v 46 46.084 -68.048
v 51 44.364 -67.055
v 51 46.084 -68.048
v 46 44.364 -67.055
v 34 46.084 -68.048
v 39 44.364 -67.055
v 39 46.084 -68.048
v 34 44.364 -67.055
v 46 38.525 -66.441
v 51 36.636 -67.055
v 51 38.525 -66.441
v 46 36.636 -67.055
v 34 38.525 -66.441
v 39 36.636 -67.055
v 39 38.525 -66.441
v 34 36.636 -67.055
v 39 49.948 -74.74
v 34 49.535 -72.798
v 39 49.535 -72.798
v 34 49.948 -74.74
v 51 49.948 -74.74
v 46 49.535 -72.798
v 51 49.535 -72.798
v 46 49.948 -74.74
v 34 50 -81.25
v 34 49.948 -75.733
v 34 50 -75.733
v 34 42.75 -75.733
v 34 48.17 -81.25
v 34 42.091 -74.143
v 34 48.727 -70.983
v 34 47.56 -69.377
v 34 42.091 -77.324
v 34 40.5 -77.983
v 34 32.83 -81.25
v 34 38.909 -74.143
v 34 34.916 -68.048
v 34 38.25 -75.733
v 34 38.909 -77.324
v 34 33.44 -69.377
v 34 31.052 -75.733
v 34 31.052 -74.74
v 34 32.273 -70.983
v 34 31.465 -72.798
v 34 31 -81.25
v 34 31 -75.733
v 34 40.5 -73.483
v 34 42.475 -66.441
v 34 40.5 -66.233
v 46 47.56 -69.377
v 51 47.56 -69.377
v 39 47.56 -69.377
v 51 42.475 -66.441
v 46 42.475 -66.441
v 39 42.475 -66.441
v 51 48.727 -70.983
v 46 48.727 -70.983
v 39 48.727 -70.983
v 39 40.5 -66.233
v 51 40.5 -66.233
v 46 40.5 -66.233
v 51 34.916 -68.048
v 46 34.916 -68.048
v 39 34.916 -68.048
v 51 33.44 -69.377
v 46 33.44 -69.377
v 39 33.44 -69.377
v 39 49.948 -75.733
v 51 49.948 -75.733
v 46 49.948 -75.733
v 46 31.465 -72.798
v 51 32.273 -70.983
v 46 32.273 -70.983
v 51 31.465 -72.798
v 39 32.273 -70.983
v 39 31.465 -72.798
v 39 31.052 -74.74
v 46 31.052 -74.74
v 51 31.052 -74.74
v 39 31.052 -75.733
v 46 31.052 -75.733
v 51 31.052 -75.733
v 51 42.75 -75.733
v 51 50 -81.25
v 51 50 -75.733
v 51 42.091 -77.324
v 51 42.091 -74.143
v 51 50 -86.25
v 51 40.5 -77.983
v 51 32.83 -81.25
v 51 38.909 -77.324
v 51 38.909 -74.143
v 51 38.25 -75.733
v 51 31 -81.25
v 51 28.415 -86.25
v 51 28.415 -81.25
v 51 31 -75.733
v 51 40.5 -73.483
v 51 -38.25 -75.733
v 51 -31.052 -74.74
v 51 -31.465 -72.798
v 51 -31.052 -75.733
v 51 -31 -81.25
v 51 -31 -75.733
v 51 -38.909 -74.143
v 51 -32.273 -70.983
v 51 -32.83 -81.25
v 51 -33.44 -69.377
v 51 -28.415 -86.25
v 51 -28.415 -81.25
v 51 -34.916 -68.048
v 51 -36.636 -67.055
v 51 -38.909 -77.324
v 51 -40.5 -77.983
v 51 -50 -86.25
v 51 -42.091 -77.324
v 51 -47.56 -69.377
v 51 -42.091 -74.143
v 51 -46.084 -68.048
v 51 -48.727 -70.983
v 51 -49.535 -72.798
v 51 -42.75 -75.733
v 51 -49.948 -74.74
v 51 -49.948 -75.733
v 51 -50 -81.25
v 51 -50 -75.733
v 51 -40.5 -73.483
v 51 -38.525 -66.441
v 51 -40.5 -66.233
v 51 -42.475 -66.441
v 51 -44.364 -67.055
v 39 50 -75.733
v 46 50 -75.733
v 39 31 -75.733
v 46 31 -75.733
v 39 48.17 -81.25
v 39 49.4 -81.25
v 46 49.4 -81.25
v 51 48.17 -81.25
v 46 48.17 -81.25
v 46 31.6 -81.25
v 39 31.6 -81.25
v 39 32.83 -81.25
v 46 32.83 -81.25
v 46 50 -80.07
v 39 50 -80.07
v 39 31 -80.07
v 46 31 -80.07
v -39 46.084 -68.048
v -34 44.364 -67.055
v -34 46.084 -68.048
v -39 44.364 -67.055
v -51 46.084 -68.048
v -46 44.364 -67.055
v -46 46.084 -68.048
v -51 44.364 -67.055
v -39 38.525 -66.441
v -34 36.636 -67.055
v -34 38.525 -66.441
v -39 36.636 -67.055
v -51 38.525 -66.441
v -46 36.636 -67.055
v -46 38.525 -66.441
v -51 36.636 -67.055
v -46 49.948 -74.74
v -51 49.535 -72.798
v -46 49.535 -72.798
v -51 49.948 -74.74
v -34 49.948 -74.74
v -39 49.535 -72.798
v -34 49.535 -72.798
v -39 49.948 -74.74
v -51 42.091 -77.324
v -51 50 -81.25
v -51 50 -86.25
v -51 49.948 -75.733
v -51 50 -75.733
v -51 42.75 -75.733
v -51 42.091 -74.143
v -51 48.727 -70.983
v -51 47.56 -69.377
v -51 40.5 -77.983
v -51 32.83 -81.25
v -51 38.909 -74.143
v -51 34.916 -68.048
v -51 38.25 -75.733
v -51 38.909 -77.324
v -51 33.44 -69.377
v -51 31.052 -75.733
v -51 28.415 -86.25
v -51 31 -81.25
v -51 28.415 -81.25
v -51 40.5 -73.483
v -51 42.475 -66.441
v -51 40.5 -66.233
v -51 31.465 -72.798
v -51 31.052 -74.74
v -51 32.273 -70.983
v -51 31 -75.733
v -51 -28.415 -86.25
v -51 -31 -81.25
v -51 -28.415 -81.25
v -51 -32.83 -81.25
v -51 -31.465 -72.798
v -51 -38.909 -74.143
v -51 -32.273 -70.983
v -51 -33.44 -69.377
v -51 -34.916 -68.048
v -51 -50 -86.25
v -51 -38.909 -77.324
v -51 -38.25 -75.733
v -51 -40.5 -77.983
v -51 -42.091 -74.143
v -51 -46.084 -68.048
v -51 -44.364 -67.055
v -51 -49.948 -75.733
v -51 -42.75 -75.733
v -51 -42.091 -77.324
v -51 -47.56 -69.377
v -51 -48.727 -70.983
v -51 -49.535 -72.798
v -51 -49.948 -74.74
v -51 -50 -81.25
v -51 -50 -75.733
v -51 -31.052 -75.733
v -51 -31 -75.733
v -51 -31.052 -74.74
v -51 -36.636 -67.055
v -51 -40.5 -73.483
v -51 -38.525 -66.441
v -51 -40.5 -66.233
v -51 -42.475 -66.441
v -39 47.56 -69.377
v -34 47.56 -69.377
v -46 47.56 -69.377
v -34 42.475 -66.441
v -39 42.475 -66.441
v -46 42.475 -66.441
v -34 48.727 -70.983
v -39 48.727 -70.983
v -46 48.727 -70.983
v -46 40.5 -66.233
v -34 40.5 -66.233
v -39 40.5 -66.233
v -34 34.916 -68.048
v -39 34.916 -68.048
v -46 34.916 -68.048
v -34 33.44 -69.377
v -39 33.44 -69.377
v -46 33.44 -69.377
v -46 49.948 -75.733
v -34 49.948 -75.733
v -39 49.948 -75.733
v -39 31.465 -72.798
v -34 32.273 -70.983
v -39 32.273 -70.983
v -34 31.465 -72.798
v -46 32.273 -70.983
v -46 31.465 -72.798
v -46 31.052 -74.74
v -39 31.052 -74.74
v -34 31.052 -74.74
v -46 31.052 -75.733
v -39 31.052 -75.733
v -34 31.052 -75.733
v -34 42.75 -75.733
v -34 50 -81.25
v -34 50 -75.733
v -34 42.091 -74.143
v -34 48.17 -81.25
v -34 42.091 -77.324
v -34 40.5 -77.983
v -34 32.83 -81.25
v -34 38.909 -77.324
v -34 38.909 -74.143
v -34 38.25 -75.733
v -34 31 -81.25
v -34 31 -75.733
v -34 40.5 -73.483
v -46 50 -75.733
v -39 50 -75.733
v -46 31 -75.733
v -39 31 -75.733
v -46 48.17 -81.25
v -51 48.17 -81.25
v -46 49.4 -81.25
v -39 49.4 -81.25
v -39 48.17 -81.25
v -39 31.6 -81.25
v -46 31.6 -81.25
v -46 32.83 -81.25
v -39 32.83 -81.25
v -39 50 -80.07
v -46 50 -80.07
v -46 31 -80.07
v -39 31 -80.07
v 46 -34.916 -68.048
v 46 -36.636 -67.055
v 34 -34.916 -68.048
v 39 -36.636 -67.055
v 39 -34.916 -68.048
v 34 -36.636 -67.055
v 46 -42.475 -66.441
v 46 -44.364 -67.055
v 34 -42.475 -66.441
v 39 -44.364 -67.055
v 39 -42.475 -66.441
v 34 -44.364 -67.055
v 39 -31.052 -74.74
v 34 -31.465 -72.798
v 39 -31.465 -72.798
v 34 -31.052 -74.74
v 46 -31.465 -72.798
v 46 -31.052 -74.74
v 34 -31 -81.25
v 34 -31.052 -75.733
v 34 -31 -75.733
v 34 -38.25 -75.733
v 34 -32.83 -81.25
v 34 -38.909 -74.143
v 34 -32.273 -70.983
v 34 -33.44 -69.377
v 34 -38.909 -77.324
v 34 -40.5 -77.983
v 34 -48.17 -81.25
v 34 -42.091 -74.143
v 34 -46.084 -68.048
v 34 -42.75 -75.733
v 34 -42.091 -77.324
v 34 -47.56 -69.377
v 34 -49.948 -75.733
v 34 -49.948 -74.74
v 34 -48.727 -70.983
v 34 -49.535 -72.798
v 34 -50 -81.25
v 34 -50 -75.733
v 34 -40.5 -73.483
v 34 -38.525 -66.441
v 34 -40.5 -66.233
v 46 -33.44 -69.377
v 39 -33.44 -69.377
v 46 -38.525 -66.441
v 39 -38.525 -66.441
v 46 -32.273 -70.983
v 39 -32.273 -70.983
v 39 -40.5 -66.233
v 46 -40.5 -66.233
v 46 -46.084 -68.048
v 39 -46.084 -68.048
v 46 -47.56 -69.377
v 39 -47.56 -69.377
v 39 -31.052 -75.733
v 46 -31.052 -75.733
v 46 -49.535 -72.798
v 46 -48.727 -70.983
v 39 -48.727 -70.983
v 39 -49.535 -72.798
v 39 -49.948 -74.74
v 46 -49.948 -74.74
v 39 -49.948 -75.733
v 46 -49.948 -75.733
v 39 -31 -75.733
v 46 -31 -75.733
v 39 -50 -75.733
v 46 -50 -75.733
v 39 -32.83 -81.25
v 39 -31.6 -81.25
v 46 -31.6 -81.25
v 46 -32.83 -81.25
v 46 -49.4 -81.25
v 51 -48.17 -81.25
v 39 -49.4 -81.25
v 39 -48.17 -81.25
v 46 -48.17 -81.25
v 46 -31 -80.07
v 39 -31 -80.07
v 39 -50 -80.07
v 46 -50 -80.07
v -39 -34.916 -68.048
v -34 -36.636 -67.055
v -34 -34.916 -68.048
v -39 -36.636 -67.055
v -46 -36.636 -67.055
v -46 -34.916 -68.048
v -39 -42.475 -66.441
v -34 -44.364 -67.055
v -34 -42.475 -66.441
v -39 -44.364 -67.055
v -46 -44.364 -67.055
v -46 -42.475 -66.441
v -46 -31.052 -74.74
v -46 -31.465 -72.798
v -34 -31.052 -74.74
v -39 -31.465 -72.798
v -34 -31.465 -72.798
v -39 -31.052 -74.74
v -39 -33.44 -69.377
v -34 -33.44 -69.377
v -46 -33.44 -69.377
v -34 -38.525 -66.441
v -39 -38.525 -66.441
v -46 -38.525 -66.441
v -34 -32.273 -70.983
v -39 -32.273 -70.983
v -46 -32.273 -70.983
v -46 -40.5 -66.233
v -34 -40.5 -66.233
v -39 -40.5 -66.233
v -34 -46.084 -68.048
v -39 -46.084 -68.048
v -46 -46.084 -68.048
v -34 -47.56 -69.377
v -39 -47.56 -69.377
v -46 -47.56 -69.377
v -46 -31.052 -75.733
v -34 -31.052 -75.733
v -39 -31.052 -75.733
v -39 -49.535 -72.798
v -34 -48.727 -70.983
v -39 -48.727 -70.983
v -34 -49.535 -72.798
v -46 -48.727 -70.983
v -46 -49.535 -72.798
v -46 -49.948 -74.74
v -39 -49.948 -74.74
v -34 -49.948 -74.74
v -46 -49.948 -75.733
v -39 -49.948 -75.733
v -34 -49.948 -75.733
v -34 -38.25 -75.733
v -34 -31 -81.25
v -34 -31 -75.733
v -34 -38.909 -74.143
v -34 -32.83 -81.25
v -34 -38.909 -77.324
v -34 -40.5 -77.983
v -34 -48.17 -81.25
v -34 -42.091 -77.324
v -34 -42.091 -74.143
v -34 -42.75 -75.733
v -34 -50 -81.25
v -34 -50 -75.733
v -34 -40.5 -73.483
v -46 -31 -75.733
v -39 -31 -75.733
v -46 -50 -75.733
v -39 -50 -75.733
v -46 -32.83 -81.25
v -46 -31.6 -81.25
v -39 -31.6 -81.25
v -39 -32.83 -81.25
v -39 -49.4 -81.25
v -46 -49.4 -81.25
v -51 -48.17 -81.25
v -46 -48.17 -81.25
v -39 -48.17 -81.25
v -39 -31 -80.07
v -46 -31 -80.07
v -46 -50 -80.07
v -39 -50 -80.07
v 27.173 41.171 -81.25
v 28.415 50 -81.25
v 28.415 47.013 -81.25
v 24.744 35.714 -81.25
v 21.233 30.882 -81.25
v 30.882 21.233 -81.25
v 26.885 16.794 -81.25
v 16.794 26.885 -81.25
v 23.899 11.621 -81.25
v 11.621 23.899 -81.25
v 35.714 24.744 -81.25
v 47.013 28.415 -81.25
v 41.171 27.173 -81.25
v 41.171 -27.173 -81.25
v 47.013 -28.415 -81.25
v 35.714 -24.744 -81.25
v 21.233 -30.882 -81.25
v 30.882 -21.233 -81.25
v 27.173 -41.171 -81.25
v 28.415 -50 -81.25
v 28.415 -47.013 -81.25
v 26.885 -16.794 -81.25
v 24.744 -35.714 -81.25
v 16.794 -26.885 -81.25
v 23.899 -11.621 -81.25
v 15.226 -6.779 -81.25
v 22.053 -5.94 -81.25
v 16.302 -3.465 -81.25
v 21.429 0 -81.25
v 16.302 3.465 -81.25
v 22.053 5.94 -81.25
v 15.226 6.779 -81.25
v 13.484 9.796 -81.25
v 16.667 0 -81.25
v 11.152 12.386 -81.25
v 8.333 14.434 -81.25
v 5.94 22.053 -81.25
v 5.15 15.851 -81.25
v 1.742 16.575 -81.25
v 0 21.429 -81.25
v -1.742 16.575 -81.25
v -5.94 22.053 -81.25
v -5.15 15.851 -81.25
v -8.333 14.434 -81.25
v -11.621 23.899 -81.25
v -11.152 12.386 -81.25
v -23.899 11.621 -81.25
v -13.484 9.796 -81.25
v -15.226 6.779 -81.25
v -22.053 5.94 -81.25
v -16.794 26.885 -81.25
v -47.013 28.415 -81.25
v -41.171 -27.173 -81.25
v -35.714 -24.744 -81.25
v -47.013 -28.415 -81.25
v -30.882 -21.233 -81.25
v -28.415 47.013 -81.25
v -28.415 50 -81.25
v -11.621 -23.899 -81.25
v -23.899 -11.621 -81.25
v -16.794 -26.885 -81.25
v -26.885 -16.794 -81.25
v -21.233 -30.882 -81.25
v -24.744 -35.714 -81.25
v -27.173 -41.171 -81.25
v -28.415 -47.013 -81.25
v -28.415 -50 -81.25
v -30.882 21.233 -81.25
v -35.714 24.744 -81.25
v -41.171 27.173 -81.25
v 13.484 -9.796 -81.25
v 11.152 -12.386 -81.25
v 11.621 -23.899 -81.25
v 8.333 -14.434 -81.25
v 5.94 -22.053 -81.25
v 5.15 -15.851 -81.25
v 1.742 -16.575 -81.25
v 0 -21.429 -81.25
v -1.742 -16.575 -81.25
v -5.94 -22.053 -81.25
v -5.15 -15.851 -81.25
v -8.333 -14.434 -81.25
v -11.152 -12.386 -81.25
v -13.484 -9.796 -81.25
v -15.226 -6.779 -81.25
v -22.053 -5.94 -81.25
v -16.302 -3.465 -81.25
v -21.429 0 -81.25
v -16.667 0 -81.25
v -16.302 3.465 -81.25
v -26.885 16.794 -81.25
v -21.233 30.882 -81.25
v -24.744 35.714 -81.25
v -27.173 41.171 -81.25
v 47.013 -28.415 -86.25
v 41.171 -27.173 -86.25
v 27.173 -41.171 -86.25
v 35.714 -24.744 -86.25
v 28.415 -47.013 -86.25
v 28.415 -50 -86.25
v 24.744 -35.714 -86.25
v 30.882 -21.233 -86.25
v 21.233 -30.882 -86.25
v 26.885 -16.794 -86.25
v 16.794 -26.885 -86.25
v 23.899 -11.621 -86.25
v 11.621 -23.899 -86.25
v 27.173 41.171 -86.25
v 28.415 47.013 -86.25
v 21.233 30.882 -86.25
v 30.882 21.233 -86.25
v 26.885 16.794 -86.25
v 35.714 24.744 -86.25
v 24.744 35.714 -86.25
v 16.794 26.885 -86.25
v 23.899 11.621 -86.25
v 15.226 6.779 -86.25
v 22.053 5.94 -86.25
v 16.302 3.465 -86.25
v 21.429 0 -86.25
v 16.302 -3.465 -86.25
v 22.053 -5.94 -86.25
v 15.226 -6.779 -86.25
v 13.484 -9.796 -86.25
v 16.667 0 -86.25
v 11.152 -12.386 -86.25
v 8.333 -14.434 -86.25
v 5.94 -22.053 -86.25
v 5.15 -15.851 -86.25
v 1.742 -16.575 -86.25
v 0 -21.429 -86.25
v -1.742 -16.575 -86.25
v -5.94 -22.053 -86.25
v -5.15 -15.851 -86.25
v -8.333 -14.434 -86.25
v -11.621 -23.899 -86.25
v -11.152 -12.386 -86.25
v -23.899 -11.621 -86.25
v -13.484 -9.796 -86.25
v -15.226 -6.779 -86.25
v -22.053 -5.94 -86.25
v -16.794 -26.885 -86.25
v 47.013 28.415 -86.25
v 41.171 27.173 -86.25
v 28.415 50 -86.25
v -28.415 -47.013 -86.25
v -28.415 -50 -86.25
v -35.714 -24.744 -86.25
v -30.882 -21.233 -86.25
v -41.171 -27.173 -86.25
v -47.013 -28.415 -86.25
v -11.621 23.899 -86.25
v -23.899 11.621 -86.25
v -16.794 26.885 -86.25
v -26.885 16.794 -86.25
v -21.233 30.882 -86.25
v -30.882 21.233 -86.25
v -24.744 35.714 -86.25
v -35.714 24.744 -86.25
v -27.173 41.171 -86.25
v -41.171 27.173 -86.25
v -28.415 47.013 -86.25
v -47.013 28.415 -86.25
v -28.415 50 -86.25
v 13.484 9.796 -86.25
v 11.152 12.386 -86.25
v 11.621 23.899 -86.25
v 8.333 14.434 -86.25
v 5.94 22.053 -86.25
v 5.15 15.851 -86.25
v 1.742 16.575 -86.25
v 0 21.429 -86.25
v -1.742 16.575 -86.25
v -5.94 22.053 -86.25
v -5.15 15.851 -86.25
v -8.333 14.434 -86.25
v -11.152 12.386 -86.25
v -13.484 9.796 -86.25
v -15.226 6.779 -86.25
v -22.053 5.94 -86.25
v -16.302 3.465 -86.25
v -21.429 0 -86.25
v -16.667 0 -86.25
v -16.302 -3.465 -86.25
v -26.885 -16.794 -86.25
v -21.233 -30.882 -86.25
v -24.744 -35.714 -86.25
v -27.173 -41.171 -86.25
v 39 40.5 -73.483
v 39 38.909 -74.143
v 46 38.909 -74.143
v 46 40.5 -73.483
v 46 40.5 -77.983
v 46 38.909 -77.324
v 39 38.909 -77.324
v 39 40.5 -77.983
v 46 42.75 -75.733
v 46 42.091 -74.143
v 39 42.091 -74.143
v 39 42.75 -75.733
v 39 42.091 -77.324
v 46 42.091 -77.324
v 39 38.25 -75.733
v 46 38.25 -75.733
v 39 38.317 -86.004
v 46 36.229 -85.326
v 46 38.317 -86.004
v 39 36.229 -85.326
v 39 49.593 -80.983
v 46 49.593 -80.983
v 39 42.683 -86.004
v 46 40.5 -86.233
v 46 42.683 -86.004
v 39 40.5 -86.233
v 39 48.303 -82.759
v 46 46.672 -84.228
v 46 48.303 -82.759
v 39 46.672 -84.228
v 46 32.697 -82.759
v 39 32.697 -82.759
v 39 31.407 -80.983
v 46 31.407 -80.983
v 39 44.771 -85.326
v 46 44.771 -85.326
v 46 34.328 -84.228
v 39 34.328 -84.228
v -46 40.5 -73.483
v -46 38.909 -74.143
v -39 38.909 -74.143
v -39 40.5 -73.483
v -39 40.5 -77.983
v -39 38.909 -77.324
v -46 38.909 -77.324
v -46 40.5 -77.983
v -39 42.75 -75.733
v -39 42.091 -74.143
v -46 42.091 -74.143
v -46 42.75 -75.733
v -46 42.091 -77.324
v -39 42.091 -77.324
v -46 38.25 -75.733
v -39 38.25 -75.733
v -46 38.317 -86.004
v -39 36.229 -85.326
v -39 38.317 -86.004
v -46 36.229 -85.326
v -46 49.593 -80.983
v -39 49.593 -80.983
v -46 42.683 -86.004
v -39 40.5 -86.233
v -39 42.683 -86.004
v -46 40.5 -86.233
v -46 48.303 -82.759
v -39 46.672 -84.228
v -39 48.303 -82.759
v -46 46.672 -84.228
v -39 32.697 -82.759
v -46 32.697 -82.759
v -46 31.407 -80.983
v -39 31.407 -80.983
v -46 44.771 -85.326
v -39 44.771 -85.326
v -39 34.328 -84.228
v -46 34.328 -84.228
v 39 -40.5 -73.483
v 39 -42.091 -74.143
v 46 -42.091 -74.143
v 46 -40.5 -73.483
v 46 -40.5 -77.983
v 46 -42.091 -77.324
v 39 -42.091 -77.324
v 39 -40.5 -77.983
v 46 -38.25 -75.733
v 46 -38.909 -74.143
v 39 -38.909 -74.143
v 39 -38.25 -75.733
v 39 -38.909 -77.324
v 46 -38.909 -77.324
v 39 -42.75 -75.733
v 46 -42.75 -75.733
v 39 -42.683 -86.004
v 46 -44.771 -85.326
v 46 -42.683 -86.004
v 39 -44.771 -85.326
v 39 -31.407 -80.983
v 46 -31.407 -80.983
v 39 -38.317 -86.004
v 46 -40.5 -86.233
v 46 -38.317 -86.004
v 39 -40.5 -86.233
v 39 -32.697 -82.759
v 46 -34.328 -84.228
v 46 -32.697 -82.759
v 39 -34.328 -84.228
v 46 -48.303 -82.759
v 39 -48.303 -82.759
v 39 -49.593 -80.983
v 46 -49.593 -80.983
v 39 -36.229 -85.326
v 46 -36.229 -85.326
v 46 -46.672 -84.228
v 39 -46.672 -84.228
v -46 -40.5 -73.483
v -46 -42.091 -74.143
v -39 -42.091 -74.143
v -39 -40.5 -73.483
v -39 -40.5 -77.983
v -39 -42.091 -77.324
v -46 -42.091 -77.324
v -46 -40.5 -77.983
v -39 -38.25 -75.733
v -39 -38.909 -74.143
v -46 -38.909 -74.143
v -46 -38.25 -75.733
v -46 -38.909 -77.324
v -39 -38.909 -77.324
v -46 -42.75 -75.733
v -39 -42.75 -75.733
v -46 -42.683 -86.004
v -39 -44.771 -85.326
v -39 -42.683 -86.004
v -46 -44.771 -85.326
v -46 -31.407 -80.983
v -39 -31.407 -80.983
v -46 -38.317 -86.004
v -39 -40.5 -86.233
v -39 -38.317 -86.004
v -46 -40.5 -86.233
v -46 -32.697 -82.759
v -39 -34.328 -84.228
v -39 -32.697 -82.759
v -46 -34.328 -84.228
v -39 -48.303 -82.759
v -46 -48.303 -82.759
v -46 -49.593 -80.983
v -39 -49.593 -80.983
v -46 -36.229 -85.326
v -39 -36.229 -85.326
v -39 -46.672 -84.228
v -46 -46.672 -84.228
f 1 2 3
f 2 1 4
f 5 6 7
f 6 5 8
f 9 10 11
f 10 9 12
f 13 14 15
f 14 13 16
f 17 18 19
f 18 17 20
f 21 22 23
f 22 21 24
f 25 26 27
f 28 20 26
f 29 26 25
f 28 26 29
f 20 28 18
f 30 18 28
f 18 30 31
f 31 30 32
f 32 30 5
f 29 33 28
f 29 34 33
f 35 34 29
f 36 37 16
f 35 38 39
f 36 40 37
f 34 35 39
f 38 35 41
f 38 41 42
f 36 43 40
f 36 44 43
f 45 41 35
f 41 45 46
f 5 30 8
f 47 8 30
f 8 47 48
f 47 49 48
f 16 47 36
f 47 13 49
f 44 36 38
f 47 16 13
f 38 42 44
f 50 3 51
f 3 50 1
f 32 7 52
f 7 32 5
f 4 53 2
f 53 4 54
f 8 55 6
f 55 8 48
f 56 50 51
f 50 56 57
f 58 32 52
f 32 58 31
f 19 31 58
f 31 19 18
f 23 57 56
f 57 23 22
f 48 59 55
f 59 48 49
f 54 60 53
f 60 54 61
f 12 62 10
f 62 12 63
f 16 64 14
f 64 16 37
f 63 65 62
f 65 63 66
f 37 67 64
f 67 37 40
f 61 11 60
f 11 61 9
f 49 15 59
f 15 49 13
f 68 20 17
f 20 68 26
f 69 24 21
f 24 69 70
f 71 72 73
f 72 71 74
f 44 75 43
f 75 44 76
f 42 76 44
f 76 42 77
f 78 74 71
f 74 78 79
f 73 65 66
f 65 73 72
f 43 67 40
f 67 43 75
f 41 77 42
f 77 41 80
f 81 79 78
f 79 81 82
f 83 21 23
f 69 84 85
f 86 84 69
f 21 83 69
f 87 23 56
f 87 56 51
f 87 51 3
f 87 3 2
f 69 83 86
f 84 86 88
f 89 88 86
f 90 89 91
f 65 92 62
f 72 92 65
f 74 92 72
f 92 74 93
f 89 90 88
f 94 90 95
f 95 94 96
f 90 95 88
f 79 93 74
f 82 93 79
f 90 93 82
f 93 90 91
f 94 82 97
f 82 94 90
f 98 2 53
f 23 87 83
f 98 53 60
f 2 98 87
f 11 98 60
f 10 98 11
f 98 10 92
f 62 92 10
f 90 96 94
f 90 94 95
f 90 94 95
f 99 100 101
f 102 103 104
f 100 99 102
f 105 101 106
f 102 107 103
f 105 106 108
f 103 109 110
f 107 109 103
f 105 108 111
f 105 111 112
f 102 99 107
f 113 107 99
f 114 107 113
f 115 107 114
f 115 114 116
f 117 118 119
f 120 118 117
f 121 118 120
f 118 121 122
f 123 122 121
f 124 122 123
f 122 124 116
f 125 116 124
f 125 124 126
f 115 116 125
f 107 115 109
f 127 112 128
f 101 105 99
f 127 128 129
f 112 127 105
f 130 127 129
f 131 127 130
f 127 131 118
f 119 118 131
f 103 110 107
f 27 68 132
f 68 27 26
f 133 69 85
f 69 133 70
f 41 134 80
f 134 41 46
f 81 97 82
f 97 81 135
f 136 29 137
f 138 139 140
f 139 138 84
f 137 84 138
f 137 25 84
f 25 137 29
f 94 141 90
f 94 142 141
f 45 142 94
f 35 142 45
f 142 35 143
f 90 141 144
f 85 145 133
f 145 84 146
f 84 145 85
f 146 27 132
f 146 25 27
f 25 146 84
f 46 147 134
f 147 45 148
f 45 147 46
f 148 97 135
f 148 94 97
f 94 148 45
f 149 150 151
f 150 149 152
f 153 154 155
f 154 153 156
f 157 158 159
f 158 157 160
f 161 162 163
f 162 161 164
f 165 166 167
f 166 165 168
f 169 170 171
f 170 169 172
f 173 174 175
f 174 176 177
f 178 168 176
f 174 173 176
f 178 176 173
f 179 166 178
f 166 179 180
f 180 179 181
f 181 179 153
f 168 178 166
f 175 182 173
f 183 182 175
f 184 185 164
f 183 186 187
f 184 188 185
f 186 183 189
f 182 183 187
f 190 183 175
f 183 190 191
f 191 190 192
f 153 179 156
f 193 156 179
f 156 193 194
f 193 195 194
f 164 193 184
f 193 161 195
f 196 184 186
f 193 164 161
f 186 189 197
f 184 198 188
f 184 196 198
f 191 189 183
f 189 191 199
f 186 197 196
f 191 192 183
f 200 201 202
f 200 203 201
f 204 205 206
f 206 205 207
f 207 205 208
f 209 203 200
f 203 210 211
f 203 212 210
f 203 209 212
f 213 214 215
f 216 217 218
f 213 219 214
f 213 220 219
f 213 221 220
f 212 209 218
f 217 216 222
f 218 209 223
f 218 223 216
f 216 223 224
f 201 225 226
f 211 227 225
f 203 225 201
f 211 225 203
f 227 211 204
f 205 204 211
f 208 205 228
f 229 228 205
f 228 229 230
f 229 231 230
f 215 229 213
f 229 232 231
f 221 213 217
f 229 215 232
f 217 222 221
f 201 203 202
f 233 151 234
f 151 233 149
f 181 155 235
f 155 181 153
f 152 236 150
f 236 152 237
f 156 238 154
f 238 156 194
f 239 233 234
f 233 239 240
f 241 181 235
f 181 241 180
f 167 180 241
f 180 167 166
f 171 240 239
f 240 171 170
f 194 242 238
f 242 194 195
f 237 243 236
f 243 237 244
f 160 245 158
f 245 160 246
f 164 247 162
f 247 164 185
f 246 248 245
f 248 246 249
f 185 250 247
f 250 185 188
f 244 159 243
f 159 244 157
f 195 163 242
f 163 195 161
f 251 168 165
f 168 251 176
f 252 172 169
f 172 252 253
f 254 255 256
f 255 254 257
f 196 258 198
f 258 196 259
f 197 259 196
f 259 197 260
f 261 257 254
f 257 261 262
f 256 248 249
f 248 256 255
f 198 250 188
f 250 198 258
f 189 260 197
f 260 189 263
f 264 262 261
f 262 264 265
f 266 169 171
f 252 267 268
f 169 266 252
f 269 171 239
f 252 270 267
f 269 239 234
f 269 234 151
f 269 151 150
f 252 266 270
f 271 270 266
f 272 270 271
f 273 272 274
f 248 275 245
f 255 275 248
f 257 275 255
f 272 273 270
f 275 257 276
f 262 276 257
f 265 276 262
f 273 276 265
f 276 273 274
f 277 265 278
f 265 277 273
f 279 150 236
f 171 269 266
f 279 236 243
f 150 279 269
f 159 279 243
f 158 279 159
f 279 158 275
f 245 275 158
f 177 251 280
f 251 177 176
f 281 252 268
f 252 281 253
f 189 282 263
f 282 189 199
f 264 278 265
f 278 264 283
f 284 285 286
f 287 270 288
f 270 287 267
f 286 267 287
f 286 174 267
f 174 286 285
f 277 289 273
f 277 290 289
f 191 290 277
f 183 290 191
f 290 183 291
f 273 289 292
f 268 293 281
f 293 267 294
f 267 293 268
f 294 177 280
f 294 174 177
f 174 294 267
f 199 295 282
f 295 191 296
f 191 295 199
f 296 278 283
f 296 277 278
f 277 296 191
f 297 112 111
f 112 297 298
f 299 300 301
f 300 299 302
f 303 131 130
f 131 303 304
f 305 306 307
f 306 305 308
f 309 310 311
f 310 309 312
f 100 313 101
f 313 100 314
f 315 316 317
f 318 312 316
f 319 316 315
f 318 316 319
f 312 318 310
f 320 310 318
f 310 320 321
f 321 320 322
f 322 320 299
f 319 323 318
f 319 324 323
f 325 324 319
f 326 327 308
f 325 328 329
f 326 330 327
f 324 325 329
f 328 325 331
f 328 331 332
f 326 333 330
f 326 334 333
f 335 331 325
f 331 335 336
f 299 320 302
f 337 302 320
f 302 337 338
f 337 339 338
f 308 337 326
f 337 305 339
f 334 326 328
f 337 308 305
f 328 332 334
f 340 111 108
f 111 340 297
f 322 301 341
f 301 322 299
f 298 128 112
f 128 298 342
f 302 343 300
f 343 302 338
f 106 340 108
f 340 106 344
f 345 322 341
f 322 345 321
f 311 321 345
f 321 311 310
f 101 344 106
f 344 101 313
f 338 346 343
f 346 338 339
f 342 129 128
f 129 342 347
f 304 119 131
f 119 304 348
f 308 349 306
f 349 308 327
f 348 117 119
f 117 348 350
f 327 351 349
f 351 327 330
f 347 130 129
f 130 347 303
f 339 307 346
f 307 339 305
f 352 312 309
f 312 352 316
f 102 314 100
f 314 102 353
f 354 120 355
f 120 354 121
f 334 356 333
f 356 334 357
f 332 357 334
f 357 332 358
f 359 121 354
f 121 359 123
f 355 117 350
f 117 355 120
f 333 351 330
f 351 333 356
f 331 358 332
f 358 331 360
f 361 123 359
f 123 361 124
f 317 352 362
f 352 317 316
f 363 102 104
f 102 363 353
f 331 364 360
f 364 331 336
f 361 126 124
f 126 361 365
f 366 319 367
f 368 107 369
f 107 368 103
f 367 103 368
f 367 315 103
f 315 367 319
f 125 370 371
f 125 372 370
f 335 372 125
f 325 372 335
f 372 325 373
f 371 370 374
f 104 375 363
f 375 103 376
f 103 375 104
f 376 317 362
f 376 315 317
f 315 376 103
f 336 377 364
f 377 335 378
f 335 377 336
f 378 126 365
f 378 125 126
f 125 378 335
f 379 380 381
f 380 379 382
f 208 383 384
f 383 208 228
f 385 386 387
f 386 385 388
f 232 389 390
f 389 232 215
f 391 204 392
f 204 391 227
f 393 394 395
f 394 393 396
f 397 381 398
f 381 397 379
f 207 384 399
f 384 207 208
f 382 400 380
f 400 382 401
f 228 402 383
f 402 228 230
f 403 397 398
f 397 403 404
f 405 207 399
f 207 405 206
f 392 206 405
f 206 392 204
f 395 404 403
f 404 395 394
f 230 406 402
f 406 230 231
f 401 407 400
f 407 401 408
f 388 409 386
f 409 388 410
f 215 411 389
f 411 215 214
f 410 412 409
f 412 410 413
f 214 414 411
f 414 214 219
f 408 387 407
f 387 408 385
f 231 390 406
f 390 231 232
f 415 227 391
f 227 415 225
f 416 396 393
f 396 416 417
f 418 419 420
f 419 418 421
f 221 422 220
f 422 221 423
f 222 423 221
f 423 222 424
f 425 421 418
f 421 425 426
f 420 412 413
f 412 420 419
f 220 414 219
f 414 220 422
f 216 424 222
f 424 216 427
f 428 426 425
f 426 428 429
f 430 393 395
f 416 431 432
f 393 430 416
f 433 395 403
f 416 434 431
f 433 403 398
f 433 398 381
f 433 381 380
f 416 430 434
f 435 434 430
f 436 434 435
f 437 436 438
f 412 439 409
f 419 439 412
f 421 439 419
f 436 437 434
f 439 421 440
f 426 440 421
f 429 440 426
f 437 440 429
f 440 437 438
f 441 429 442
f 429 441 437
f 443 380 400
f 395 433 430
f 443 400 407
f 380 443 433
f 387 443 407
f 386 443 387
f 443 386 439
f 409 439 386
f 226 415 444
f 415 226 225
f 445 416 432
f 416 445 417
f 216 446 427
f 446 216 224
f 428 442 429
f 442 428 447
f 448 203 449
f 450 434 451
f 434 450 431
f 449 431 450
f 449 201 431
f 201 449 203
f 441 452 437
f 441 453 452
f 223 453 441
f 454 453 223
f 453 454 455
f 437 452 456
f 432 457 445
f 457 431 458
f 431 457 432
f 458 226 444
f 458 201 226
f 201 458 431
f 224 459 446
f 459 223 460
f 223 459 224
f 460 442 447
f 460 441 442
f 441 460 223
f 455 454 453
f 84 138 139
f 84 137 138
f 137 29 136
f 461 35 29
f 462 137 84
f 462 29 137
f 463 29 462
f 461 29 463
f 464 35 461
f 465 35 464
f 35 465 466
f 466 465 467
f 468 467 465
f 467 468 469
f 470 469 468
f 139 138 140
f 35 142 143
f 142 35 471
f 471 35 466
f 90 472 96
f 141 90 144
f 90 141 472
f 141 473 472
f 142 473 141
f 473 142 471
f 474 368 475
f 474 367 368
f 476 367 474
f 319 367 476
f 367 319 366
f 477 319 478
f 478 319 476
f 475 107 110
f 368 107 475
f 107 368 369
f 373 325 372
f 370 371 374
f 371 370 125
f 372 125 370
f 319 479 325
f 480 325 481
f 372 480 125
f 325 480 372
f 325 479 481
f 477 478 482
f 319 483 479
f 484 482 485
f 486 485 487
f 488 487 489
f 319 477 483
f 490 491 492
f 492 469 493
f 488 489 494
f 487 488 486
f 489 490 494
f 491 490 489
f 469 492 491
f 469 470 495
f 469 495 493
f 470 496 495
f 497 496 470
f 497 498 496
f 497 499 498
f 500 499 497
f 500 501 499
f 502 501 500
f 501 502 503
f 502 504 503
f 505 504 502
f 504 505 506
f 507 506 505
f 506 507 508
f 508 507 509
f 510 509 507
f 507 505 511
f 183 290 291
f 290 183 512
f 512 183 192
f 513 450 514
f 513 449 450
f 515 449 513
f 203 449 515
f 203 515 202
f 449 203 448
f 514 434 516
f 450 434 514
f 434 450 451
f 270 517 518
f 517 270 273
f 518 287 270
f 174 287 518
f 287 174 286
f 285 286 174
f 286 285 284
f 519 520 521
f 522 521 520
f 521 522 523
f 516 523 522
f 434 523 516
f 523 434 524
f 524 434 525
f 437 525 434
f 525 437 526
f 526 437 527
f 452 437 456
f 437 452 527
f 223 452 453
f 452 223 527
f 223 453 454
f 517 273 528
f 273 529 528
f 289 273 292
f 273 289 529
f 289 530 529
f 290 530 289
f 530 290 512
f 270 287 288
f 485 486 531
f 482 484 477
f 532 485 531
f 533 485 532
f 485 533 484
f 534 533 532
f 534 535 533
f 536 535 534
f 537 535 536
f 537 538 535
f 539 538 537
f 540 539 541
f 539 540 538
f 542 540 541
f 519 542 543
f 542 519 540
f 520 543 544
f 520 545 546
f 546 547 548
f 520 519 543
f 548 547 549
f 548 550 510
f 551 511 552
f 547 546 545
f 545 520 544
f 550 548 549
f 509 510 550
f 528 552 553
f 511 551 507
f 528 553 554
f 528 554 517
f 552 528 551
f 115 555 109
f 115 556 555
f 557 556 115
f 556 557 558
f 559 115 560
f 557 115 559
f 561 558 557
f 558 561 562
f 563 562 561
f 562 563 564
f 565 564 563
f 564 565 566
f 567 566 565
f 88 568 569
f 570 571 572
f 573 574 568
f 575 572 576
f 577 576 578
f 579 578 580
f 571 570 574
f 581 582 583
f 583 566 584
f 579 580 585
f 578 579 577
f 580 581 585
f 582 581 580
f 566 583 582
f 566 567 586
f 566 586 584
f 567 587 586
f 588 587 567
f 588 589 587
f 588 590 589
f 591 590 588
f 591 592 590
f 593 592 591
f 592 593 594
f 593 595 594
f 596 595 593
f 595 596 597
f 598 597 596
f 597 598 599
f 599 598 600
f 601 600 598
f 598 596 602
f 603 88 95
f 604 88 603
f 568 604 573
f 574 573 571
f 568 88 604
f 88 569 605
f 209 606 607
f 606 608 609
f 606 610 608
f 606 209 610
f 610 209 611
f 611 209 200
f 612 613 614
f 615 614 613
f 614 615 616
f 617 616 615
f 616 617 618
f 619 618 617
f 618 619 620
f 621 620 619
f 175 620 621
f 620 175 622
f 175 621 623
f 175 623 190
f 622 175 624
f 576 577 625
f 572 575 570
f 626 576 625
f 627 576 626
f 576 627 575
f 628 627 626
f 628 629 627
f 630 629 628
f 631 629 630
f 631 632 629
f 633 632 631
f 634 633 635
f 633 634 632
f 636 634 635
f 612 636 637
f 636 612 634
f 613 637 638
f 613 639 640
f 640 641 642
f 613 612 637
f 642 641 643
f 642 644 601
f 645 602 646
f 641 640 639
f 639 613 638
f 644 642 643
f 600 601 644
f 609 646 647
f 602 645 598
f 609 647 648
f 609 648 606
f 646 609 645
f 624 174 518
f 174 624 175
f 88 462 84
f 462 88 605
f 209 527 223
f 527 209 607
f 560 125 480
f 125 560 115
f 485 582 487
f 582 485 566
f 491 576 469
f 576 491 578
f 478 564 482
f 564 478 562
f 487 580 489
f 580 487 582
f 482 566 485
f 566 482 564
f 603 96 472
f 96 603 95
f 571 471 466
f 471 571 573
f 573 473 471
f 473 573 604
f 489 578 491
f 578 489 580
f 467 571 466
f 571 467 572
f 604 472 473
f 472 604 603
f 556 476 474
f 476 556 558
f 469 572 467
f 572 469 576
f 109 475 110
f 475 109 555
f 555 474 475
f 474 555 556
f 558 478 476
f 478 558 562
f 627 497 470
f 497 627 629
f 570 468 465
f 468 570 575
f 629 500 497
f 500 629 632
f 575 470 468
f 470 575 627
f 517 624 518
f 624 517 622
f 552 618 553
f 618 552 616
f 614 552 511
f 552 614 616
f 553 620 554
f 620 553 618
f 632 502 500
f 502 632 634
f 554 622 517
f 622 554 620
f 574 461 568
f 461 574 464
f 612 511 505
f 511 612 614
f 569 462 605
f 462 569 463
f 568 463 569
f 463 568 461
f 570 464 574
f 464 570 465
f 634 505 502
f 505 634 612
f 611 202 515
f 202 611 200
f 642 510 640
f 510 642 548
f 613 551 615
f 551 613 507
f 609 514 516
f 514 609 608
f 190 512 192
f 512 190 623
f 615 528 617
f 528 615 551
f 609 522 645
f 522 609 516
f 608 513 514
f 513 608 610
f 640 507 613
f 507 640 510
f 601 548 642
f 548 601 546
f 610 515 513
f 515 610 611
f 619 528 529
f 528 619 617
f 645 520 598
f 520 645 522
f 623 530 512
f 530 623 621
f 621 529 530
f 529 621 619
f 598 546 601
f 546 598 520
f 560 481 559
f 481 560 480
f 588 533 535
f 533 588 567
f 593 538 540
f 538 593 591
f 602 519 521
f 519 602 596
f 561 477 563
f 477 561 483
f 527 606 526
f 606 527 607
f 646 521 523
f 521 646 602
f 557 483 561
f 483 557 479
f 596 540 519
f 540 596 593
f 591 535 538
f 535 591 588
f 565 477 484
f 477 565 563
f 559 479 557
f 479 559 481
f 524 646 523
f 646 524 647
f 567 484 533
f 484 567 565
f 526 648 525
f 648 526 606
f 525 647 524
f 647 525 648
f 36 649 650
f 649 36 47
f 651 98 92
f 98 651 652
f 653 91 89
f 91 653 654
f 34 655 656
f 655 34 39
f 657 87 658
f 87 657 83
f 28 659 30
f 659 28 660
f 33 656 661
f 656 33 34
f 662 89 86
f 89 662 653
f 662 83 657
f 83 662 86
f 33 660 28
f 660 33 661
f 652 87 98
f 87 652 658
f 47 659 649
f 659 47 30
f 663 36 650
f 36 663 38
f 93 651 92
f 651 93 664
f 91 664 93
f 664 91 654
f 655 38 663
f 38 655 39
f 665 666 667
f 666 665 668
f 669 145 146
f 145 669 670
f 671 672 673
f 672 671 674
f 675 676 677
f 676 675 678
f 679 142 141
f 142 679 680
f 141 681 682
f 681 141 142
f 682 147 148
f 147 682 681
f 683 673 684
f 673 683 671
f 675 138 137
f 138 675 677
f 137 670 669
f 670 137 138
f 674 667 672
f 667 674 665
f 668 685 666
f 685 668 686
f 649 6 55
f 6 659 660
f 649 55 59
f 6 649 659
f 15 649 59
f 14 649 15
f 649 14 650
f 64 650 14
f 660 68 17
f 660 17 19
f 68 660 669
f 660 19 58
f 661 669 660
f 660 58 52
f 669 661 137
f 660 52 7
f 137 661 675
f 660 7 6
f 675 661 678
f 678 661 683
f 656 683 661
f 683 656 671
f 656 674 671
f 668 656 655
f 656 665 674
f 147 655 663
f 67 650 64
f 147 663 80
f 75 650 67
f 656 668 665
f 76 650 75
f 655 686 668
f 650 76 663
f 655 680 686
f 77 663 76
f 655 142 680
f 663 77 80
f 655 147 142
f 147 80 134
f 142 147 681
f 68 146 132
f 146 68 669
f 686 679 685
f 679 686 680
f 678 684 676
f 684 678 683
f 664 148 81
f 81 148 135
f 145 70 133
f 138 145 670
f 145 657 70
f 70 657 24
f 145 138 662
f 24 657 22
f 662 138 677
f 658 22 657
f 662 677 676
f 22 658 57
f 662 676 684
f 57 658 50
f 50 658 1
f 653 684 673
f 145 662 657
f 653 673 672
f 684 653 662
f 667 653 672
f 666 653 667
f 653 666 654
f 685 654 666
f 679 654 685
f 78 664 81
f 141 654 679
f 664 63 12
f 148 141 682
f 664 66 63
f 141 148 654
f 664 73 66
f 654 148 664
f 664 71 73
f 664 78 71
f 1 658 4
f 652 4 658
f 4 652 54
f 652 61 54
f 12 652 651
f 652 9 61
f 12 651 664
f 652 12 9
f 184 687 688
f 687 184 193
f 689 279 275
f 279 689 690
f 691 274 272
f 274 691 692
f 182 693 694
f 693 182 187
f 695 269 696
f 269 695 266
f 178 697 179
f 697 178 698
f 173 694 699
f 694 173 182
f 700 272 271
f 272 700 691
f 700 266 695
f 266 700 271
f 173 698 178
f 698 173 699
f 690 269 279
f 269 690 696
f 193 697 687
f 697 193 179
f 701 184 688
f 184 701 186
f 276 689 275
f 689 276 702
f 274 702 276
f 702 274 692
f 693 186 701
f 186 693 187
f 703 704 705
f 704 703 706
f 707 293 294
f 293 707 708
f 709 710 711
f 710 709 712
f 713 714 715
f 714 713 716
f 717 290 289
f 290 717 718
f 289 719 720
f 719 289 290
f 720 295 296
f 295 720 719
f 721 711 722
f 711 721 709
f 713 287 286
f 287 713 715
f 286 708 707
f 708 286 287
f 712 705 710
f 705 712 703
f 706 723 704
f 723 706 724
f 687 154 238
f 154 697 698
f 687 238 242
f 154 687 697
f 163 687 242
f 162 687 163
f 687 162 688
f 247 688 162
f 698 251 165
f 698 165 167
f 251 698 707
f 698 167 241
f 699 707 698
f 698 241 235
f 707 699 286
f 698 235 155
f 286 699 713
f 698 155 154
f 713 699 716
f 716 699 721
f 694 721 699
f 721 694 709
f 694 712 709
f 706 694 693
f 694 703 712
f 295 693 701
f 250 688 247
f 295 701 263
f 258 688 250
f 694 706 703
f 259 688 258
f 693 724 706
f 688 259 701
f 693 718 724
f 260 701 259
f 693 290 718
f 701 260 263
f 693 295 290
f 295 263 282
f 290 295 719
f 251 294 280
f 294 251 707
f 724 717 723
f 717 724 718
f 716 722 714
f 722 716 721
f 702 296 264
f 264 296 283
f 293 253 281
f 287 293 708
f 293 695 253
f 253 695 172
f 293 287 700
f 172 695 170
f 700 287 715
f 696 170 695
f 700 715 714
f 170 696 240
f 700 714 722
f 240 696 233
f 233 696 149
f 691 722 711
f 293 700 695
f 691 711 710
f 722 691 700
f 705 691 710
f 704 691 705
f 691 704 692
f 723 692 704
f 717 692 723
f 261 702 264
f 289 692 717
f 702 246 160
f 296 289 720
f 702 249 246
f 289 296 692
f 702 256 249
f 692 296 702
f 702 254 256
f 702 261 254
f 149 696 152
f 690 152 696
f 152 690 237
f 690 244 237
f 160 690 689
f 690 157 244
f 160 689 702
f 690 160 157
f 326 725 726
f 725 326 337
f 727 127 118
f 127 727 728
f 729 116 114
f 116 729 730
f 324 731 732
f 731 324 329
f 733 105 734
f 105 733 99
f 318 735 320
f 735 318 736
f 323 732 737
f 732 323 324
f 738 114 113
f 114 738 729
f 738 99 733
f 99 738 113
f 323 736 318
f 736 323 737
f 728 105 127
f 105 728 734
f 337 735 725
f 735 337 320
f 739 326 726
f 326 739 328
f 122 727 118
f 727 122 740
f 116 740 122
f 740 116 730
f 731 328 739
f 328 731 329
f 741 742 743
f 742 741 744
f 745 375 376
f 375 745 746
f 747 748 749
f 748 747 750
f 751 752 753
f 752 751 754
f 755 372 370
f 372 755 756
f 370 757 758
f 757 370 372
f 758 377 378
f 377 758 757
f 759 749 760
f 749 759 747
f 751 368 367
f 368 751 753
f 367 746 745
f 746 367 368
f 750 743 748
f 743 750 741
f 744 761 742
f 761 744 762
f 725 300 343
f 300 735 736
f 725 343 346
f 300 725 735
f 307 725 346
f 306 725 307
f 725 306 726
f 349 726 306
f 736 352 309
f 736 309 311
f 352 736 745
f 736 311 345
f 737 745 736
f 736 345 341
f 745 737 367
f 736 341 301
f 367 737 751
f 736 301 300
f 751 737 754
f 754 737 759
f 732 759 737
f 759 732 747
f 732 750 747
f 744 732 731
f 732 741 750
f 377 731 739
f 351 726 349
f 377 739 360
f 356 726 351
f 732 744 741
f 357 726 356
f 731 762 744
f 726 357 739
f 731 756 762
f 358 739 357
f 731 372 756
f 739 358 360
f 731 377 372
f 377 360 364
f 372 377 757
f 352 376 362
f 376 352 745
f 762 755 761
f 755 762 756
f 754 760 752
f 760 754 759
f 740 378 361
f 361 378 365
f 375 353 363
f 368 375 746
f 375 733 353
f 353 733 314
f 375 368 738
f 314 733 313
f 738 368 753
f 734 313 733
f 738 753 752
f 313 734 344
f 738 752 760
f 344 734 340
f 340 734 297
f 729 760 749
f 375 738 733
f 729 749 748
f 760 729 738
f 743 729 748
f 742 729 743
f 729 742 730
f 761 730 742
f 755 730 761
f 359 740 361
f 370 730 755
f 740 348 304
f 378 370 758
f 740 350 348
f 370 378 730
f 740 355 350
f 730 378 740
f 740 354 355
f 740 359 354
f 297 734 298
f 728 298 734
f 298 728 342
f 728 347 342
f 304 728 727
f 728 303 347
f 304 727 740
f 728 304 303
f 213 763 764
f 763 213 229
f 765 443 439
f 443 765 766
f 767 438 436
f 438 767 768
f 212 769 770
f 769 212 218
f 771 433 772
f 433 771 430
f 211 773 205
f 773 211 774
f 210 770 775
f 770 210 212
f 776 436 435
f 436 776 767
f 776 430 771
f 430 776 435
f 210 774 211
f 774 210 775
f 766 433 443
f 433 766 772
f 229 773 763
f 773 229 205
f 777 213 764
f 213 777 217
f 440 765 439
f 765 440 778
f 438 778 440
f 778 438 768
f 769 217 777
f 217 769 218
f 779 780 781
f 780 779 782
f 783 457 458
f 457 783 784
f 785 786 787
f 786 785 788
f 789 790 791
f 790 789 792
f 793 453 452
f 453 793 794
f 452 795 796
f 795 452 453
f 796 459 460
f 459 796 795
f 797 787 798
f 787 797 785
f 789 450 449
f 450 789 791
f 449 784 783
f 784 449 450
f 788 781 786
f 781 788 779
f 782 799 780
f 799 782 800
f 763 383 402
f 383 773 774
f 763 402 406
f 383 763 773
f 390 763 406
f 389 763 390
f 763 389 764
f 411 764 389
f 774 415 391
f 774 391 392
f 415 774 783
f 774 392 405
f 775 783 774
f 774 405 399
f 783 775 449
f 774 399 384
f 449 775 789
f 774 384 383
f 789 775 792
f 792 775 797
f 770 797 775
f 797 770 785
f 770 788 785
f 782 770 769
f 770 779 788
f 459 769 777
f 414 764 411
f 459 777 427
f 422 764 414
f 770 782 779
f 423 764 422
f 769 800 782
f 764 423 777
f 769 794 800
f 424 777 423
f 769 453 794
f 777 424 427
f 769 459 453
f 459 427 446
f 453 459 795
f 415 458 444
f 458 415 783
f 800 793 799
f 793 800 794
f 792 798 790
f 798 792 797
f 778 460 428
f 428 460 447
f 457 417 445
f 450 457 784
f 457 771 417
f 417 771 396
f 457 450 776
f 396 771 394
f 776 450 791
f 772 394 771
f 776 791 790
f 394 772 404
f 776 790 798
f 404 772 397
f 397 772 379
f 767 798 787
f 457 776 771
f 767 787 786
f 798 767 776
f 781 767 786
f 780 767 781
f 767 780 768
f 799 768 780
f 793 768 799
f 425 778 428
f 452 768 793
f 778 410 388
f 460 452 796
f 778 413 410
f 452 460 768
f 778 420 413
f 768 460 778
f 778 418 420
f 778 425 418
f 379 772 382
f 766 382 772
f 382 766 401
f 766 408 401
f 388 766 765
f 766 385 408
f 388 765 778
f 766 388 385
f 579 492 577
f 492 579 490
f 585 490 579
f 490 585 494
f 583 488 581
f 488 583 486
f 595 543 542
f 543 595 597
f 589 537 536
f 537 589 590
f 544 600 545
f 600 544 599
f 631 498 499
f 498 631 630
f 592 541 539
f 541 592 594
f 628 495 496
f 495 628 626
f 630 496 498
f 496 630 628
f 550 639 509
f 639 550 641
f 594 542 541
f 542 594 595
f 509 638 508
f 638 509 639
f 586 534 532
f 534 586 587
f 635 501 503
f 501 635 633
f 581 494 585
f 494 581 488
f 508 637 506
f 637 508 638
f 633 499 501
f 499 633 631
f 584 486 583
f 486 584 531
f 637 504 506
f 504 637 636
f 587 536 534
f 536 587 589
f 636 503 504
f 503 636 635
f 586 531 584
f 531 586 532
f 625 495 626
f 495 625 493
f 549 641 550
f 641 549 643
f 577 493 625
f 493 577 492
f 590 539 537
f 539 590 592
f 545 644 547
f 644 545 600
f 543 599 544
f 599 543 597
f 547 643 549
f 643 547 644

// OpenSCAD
//Created by Cid Vilas
//http://www.flickr.com/CidVilas/


//################################################################################
//##                                                                            ##
//##                PLEASE READ INSTRUCTIONS BEFORE MODIFYING                   ##
//##                                                                            ##
//################################################################################


//Specification of the Spool Dimensions:
//		spool_wall = The thickness of the walls of the spool
//		spool_width = The dimension of the spool from outer side to opposite outer side
//		spool_diameter = The diameter of the outer edges of the spool body, not the
//					filament outer diameter (The filament should not extend
//					past this dimension)
//		hole_diameter = The diameter of the hole inside the spool (Currently
//					unused.  Included for just to be thorough)

//Specification of the Hardware:
//		bearing_diameter = The outer diameter of the bearing.  (If you plan on adding
//						a fender washer or lip in the plastic, be sure to offset here)
//		bearing_thickness = The side to side dimension of the bearing.  (If you plan on
//						adding washers, be sure to add to the dimensions)
//		bolt_diameter = This is the diameter of the bolt to be used to secure the bearing
//					and washers to the spool holder.

//Specification of the Spool Holder
//		holder_base_length = In order to properly fit your spool, and maintain stability
//						of the spool holder, be sure this dimension is as wide as
//						possible.  If this value is too small, the spool holder
//						will compare to a football balanced on a Golf Tee.
//		holder_base_height = The thickness of the base of the stand.  Increase for
//						durability, but this will increase pastic usage.
//		holder_wall = This is the thickness of the plastic around the bearing capture.

//NOTE:  The remaining values are not for customization of the stand.  They are used for
//		design.  Adjust at your own risk!


spool_wall = 5;
spool_width = 90 - spool_wall;
spool_diameter = 162.5;
hole_diameter = 37.5;

bearing_diameter = 19;			//Bearing + Fender = 13 + 6 = 19
bearing_thickness = 7;			//Bearing + 2xWasher = 5 + (2) = 7
bolt_diameter = 4.5;



holder_wall = 5;
holder_base_height = 5;
holder_base_width = spool_width + holder_wall;
holder_base_length = 100;

holder_bearing_width = bearing_diameter;
bearing_radius = spool_diameter / 2 + bearing_diameter / 2;
bearing_degree = acos((holder_base_length / 2) / (bearing_radius));
holder_bearing_height = bearing_radius * sin(-bearing_degree)  + spool_diameter/2;


module spool()
{
	rotate([0, 90, 0])
	difference()
	{
	union()
	{
		color([0.1,0.1,0.1])
		translate([0, 0, spool_width / 2])
		cylinder(r = spool_diameter / 2, h = spool_wall, center = true, $fn = 64);
		color([0.1,0.1,0.1])
		translate([0, 0, -(spool_width / 2)])
		cylinder(r = spool_diameter / 2, h = spool_wall, center = true, $fn = 64);
		color([0.5, 0, 0.7])
		translate([0, 0, 0])
		cylinder(r = spool_diameter / 2 - spool_wall, h = spool_width - spool_wall, center = true);
	}
	union()
	{
		color([0.6, 0.6, 0.6])
		cylinder(r = hole_diameter / 2, h = spool_width + spool_wall + 0.1, center = true);
	}
	}
}

module holder()
{
	color([1, 0, 0])
	translate([0, 0, -spool_diameter / 2])
	difference()
	{
	union()
	{
		translate([0, 0, -holder_base_height / 2])	
		cube([spool_width + bearing_thickness + holder_wall * 2,
			holder_base_length,
			holder_base_height], center = true);
		
		translate([spool_width / 2,
				holder_base_length / 2 - bearing_diameter / 2,
				holder_bearing_height])
		union()
		{
			rotate([0, 90, 0])
			cylinder(r = bearing_diameter / 2, h = bearing_thickness + holder_wall * 2, center = true);
			
			translate([0, 0, -holder_bearing_height / 2])
			cube([bearing_thickness + holder_wall * 2, bearing_diameter, holder_bearing_height], center = true);
		}
		translate([-spool_width / 2,
				holder_base_length / 2 - bearing_diameter / 2,
				holder_bearing_height])
		union()
		{
			rotate([0, 90, 0])
			cylinder(r = bearing_diameter / 2, h = bearing_thickness + holder_wall * 2, center = true);
			
			translate([0, 0, -holder_bearing_height / 2])
			cube([bearing_thickness + holder_wall * 2, bearing_diameter, holder_bearing_height], center = true);
		}


		translate([spool_width / 2,
				-(holder_base_length / 2 - bearing_diameter / 2),
				holder_bearing_height])
		union()
		{
			rotate([0, 90, 0])
			cylinder(r = bearing_diameter / 2, h = bearing_thickness + holder_wall * 2, center = true);
			
			translate([0, 0, -holder_bearing_height / 2])
			cube([bearing_thickness + holder_wall * 2, bearing_diameter, holder_bearing_height], center = true);
		}
		translate([-spool_width / 2,
				-(holder_base_length / 2 - bearing_diameter / 2),
				holder_bearing_height])
		union()
		{
			rotate([0, 90, 0])
			cylinder(r = bearing_diameter / 2, h = bearing_thickness + holder_wall * 2, center = true);
			
			translate([0, 0, -holder_bearing_height / 2])
			cube([bearing_thickness + holder_wall * 2, bearing_diameter, holder_bearing_height], center = true);
		}

	}
	union()
	{
		translate([0, 0, -holder_base_height / 2])	
		cylinder(r = holder_base_length / 6, h = holder_base_height + 0.05, center = true);		
		for(i = [0 : 3])
		{
			rotate([0, 0, i * 90])
			translate([holder_base_length / 2, 0, -holder_base_height / 2])	
			cylinder(r = holder_base_length / 3.5, h = holder_base_height + 0.05, center = true);
		}
		translate([spool_width / 2,
				holder_base_length / 2 - bearing_diameter / 2,
				holder_bearing_height])
		union()
		{
			rotate([0, 90, 0])
			cylinder(r = bolt_diameter / 2, h = spool_wall + bearing_thickness * 2 + 0.1, center = true);

			rotate([0, 90, 0])
			cylinder(r = bearing_diameter / 2 + 1, h = bearing_thickness, center = true);
		}
		translate([-spool_width / 2,
				holder_base_length / 2 - bearing_diameter / 2,
				holder_bearing_height])
		union()
		{
			rotate([0, 90, 0])
			cylinder(r = bolt_diameter / 2, h = spool_wall + bearing_thickness * 2 + 0.1, center = true);

			rotate([0, 90, 0])
			cylinder(r = bearing_diameter / 2 + 1, h = bearing_thickness, center = true);
		}


		translate([spool_width / 2,
				-(holder_base_length / 2 - bearing_diameter / 2),
				holder_bearing_height])
		union()
		{
			rotate([0, 90, 0])
			cylinder(r = bolt_diameter / 2, h = spool_wall + bearing_thickness * 2 + 0.1, center = true);

			rotate([0, 90, 0])
			cylinder(r = bearing_diameter / 2 + 1, h = bearing_thickness, center = true);
		}
		translate([-spool_width / 2,
				-(holder_base_length / 2 - bearing_diameter / 2),
				holder_bearing_height])
		union()
		{
			rotate([0, 90, 0])
			cylinder(r = bolt_diameter / 2, h = spool_wall + bearing_thickness * 2 + 0.1, center = true);

			rotate([0, 90, 0])
			cylinder(r = bearing_diameter / 2 + 1, h = bearing_thickness, center = true);
		}

	}
	}
}

holder();
//spool();
